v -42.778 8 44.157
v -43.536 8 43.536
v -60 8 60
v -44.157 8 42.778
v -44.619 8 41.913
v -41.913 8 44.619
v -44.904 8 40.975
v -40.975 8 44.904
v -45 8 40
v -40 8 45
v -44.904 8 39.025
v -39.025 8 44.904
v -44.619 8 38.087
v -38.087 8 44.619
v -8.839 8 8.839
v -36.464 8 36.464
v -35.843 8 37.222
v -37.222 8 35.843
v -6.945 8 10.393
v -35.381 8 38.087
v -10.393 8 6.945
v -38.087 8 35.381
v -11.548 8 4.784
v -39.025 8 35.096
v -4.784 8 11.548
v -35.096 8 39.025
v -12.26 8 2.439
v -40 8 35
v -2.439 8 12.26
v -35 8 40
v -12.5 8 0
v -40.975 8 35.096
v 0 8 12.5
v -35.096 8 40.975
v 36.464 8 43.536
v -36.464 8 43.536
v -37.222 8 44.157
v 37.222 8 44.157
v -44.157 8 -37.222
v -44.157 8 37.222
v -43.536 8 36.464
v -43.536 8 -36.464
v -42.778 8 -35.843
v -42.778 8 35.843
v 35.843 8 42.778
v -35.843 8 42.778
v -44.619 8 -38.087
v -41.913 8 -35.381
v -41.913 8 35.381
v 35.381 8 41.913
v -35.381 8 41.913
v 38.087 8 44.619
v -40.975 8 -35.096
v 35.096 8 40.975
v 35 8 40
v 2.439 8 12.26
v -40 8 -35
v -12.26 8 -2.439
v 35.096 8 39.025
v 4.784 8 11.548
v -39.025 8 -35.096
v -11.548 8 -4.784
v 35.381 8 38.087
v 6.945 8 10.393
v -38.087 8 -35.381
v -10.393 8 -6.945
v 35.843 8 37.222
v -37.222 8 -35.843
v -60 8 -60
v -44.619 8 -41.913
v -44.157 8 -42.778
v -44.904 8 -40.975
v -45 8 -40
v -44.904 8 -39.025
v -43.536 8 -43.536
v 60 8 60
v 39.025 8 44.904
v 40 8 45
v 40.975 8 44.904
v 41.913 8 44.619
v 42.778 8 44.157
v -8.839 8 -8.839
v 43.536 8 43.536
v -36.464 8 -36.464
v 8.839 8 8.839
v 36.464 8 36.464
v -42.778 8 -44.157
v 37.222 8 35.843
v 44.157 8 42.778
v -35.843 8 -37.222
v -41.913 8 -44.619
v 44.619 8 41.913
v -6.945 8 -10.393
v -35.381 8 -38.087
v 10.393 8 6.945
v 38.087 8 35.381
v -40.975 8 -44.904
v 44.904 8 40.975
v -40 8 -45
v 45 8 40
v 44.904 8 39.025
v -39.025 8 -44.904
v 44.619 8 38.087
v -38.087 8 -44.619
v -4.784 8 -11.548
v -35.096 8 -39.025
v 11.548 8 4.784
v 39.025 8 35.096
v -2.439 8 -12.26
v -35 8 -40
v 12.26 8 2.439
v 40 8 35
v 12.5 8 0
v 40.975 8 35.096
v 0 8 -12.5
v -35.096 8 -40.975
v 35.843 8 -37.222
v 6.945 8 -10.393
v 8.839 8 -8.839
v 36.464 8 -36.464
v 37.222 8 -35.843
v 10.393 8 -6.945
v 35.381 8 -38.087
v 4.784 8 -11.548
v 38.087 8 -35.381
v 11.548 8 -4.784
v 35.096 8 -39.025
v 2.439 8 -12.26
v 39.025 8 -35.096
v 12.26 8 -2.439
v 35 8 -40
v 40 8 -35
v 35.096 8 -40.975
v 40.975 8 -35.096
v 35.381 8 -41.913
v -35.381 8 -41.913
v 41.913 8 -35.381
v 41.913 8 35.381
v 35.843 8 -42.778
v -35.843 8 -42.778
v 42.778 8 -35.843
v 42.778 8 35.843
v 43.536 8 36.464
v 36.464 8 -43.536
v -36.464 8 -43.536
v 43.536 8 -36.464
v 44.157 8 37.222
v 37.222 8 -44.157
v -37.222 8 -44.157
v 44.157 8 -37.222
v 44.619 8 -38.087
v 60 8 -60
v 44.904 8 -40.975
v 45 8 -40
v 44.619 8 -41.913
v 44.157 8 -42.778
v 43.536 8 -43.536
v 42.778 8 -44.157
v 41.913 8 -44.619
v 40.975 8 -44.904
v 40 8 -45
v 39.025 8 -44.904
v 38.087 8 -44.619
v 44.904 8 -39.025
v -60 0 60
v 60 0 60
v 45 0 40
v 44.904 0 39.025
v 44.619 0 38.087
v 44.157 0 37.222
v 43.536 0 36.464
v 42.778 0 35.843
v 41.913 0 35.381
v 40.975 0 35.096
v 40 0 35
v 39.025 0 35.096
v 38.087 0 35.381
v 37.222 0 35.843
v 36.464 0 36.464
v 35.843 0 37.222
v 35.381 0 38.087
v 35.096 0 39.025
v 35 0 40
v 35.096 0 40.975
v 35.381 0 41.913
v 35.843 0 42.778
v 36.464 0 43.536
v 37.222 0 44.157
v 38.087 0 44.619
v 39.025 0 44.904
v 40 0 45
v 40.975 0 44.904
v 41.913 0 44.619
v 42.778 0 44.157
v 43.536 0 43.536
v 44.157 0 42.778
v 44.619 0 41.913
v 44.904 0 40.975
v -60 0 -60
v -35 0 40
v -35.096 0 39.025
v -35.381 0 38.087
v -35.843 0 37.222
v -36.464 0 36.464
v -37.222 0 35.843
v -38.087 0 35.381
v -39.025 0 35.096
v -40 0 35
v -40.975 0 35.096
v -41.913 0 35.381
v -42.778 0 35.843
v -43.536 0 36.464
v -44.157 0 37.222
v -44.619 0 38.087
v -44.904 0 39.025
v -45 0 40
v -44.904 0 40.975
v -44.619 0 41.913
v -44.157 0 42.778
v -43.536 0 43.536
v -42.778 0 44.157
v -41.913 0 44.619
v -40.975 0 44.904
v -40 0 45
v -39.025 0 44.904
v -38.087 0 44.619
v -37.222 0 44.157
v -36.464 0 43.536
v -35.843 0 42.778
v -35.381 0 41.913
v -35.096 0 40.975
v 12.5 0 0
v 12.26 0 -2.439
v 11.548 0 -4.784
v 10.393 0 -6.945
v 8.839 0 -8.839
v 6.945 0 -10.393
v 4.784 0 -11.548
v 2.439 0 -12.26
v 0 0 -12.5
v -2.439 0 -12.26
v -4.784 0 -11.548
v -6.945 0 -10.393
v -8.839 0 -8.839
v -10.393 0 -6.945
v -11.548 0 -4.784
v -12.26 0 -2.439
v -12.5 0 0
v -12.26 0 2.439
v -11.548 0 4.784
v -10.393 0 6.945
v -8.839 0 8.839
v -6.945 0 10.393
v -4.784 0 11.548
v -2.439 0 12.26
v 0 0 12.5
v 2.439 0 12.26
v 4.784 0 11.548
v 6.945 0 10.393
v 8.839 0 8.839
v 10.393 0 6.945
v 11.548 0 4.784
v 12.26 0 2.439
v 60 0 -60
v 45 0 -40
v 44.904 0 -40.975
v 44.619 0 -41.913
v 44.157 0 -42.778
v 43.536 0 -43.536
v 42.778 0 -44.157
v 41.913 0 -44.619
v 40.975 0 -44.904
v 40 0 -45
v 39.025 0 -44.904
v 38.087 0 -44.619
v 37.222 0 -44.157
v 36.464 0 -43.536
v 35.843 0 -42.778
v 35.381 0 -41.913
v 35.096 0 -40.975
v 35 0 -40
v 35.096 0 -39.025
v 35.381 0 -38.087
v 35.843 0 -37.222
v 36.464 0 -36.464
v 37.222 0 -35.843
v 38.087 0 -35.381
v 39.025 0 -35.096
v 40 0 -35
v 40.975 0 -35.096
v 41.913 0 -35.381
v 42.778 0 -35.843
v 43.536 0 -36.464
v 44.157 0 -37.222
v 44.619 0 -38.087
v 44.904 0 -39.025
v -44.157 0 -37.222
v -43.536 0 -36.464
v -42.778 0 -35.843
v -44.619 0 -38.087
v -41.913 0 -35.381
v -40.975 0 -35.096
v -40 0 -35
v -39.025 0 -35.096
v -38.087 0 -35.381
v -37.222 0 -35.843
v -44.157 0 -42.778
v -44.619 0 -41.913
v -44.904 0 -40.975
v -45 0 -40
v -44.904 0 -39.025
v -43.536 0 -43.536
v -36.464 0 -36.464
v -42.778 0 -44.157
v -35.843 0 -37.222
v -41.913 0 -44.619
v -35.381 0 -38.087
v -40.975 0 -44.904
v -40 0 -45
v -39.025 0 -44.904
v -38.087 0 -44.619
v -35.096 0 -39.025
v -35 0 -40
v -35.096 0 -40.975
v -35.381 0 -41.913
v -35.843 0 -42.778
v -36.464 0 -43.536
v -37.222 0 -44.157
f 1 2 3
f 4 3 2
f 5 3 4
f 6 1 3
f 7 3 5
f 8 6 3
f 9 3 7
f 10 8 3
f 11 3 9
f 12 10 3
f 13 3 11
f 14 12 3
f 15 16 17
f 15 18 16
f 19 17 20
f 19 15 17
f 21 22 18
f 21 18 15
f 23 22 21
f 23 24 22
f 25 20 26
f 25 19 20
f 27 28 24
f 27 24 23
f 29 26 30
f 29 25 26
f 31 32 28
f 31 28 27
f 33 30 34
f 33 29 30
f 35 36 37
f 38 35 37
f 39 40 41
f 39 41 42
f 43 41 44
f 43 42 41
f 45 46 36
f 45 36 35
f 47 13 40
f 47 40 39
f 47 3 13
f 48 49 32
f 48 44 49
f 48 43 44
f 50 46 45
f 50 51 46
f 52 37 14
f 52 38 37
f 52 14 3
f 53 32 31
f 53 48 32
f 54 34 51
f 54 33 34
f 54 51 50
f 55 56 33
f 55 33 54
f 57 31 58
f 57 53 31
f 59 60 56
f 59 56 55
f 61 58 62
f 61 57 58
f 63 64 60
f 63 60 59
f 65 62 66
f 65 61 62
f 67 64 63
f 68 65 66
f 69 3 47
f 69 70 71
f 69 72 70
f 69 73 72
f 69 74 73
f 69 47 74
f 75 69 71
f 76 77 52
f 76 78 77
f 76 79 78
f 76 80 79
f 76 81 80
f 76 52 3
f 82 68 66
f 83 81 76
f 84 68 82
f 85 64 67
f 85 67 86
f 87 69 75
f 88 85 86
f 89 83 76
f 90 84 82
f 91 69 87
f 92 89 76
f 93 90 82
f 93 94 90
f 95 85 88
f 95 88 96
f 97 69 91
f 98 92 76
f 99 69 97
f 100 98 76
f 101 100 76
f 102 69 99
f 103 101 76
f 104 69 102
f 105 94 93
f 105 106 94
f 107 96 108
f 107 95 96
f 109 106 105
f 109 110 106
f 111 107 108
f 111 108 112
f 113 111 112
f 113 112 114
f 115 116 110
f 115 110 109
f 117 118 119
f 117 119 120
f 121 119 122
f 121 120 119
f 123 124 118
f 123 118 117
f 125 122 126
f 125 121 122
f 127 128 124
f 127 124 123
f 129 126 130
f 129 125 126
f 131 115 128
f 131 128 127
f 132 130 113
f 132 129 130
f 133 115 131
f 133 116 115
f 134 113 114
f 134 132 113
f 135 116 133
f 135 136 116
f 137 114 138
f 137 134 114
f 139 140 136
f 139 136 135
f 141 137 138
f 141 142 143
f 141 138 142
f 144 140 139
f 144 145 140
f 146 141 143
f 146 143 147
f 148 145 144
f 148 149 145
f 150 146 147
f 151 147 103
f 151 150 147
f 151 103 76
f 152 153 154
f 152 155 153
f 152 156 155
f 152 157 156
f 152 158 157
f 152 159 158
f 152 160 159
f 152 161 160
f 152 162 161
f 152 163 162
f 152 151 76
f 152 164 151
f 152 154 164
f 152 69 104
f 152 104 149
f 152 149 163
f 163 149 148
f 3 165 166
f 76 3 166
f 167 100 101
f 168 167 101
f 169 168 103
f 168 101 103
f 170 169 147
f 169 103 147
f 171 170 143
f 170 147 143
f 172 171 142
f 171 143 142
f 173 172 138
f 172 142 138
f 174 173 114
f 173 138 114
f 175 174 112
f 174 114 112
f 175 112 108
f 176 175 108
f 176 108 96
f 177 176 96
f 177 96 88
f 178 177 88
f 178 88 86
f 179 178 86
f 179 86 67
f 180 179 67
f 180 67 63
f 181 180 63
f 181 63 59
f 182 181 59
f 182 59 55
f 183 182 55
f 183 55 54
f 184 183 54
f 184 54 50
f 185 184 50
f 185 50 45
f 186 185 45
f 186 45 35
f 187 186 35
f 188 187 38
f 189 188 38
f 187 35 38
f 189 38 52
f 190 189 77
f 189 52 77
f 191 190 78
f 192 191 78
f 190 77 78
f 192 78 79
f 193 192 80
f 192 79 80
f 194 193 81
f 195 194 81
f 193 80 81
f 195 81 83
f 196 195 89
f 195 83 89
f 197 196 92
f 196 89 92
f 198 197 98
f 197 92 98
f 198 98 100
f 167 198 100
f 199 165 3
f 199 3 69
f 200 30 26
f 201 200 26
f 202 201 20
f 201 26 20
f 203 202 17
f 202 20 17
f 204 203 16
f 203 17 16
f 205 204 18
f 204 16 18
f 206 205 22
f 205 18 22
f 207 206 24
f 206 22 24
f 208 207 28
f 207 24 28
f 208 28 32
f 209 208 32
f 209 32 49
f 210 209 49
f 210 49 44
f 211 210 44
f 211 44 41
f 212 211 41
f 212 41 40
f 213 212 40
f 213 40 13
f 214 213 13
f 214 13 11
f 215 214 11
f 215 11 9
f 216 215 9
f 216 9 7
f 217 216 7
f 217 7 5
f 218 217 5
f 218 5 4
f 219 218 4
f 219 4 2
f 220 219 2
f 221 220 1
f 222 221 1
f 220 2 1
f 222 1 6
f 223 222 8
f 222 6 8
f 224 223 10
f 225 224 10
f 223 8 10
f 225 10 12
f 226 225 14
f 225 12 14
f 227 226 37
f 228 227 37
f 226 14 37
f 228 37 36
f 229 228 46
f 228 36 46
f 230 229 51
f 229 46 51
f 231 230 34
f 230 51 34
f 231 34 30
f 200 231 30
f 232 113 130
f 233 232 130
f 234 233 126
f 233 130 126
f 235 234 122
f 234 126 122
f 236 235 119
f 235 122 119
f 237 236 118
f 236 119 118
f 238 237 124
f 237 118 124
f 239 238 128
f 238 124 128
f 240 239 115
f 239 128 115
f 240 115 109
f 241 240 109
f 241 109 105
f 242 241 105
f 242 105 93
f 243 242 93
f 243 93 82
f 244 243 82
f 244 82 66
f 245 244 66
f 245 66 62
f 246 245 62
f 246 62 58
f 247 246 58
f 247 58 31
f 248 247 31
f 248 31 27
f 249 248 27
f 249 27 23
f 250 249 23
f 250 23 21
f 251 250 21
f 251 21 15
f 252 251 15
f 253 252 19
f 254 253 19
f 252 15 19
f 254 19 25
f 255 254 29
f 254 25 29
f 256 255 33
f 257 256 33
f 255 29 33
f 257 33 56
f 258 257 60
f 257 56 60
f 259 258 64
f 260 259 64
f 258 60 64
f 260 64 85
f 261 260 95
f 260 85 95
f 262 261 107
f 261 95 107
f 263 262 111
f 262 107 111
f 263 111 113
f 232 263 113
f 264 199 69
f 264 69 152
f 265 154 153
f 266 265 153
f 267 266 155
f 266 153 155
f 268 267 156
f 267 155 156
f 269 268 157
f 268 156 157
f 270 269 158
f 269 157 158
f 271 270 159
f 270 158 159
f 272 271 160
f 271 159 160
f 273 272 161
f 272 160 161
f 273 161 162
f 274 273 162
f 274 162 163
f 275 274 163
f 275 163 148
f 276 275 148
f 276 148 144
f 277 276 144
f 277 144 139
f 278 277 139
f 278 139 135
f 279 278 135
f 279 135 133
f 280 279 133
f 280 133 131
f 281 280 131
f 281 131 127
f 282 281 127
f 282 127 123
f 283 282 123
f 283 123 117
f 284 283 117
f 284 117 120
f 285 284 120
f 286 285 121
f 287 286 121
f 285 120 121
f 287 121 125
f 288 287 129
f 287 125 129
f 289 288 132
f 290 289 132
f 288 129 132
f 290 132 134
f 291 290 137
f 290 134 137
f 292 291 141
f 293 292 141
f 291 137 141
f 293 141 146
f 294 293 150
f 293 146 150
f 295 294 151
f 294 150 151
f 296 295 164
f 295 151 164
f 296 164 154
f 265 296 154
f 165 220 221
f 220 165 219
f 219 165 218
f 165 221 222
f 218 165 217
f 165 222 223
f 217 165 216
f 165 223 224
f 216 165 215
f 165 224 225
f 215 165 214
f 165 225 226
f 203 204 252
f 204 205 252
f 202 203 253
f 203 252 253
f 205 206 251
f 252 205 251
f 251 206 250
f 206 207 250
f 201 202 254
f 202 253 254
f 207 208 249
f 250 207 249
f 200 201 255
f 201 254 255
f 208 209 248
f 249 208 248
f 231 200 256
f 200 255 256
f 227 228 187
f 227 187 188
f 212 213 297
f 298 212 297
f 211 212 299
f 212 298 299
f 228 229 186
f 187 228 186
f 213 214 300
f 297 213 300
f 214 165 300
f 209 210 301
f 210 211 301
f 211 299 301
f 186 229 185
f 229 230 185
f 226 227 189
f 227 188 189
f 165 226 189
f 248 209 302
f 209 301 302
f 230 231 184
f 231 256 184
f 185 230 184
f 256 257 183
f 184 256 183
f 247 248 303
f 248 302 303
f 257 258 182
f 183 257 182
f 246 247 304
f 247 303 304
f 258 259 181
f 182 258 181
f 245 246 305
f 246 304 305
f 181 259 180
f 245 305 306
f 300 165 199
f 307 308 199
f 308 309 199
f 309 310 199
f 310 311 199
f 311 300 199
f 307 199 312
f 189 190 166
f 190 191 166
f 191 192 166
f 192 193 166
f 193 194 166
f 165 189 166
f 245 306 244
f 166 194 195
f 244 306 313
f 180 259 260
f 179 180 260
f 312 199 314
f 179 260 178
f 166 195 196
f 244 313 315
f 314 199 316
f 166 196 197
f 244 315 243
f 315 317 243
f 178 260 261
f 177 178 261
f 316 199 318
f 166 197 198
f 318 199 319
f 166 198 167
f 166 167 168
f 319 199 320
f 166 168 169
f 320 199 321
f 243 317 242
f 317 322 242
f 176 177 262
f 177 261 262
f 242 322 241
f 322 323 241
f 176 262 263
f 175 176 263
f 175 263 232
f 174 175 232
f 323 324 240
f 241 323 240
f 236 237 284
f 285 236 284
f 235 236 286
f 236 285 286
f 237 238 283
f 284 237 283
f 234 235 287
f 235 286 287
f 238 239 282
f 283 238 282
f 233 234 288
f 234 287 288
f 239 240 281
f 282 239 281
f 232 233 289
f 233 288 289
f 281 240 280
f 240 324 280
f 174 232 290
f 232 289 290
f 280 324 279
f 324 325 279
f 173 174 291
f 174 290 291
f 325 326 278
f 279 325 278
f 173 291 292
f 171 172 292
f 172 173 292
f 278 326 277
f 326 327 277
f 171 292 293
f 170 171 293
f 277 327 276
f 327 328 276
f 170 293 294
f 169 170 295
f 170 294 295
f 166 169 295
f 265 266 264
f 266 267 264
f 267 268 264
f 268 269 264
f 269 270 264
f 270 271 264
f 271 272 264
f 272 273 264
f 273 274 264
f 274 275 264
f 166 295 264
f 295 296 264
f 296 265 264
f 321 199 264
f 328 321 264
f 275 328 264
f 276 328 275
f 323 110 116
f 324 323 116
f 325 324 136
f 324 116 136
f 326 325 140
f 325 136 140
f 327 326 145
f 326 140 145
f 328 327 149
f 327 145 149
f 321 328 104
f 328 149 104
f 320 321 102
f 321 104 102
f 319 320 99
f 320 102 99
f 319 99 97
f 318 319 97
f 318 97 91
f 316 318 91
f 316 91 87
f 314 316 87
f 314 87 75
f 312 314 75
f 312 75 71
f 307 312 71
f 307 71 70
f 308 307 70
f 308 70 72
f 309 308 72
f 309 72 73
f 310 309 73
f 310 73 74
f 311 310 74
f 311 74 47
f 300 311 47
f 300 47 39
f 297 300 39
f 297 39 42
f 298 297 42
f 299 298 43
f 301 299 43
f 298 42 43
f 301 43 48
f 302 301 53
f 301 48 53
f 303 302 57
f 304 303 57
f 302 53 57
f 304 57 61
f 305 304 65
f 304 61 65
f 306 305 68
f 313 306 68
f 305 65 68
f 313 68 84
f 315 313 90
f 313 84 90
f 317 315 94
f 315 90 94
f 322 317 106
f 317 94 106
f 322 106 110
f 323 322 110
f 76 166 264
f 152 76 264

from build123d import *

# Parameters (mm, degrees)
SKETCH3_W            = 120
SKETCH3_H            = 120
BOSS_EXTRUDE2_DEPTH  = 8
SKETCH5_R            = 12.5
CUT_EXTRUDE1_DEPTH   = 9
SKETCH6_R            = 5
CUT_EXTRUDE2_DEPTH   = 9
LPATTERN1_COUNT      = 2
LPATTERN1_PITCH      = 80
LPATTERN1_COUNT_DIR2 = 2
LPATTERN1_PITCH_DIR2 = 80


with BuildPart() as part:
    # Sketch3 → Boss-Extrude2 (new body)
    with BuildSketch(Plane(origin=(0, 0, 0), x_dir=(1, 0, 0), z_dir=(0, 1, 0))):
        Rectangle(SKETCH3_W, SKETCH3_H)
    extrude(amount=BOSS_EXTRUDE2_DEPTH)

    # Sketch5 → Cut-Extrude1 (cut, through all)
    with BuildSketch(Plane(origin=(0, 8, 0), x_dir=(1, 0, 0), z_dir=(0, 1, 0))):
        Circle(SKETCH5_R)
    extrude(amount=-CUT_EXTRUDE1_DEPTH, mode=Mode.SUBTRACT)

    # Sketch6 → Cut-Extrude2 (cut, through all)
    with BuildSketch(Plane(origin=(0, 8, 0), x_dir=(1, 0, 0), z_dir=(0, 1, 0))):
        with Locations((-40, 40)):
            Circle(SKETCH6_R)
    cut_extrude2 = extrude(amount=-CUT_EXTRUDE2_DEPTH, mode=Mode.SUBTRACT)

    # LPattern1: Cut-Extrude2 2 × 2
    with Locations(*[(j * LPATTERN1_PITCH_DIR2, 0, i * LPATTERN1_PITCH) for i in range(LPATTERN1_COUNT) for j in range(LPATTERN1_COUNT_DIR2) if (i, j) != (0, 0)]):
        add(cut_extrude2, mode=Mode.SUBTRACT)


solid = part.part
